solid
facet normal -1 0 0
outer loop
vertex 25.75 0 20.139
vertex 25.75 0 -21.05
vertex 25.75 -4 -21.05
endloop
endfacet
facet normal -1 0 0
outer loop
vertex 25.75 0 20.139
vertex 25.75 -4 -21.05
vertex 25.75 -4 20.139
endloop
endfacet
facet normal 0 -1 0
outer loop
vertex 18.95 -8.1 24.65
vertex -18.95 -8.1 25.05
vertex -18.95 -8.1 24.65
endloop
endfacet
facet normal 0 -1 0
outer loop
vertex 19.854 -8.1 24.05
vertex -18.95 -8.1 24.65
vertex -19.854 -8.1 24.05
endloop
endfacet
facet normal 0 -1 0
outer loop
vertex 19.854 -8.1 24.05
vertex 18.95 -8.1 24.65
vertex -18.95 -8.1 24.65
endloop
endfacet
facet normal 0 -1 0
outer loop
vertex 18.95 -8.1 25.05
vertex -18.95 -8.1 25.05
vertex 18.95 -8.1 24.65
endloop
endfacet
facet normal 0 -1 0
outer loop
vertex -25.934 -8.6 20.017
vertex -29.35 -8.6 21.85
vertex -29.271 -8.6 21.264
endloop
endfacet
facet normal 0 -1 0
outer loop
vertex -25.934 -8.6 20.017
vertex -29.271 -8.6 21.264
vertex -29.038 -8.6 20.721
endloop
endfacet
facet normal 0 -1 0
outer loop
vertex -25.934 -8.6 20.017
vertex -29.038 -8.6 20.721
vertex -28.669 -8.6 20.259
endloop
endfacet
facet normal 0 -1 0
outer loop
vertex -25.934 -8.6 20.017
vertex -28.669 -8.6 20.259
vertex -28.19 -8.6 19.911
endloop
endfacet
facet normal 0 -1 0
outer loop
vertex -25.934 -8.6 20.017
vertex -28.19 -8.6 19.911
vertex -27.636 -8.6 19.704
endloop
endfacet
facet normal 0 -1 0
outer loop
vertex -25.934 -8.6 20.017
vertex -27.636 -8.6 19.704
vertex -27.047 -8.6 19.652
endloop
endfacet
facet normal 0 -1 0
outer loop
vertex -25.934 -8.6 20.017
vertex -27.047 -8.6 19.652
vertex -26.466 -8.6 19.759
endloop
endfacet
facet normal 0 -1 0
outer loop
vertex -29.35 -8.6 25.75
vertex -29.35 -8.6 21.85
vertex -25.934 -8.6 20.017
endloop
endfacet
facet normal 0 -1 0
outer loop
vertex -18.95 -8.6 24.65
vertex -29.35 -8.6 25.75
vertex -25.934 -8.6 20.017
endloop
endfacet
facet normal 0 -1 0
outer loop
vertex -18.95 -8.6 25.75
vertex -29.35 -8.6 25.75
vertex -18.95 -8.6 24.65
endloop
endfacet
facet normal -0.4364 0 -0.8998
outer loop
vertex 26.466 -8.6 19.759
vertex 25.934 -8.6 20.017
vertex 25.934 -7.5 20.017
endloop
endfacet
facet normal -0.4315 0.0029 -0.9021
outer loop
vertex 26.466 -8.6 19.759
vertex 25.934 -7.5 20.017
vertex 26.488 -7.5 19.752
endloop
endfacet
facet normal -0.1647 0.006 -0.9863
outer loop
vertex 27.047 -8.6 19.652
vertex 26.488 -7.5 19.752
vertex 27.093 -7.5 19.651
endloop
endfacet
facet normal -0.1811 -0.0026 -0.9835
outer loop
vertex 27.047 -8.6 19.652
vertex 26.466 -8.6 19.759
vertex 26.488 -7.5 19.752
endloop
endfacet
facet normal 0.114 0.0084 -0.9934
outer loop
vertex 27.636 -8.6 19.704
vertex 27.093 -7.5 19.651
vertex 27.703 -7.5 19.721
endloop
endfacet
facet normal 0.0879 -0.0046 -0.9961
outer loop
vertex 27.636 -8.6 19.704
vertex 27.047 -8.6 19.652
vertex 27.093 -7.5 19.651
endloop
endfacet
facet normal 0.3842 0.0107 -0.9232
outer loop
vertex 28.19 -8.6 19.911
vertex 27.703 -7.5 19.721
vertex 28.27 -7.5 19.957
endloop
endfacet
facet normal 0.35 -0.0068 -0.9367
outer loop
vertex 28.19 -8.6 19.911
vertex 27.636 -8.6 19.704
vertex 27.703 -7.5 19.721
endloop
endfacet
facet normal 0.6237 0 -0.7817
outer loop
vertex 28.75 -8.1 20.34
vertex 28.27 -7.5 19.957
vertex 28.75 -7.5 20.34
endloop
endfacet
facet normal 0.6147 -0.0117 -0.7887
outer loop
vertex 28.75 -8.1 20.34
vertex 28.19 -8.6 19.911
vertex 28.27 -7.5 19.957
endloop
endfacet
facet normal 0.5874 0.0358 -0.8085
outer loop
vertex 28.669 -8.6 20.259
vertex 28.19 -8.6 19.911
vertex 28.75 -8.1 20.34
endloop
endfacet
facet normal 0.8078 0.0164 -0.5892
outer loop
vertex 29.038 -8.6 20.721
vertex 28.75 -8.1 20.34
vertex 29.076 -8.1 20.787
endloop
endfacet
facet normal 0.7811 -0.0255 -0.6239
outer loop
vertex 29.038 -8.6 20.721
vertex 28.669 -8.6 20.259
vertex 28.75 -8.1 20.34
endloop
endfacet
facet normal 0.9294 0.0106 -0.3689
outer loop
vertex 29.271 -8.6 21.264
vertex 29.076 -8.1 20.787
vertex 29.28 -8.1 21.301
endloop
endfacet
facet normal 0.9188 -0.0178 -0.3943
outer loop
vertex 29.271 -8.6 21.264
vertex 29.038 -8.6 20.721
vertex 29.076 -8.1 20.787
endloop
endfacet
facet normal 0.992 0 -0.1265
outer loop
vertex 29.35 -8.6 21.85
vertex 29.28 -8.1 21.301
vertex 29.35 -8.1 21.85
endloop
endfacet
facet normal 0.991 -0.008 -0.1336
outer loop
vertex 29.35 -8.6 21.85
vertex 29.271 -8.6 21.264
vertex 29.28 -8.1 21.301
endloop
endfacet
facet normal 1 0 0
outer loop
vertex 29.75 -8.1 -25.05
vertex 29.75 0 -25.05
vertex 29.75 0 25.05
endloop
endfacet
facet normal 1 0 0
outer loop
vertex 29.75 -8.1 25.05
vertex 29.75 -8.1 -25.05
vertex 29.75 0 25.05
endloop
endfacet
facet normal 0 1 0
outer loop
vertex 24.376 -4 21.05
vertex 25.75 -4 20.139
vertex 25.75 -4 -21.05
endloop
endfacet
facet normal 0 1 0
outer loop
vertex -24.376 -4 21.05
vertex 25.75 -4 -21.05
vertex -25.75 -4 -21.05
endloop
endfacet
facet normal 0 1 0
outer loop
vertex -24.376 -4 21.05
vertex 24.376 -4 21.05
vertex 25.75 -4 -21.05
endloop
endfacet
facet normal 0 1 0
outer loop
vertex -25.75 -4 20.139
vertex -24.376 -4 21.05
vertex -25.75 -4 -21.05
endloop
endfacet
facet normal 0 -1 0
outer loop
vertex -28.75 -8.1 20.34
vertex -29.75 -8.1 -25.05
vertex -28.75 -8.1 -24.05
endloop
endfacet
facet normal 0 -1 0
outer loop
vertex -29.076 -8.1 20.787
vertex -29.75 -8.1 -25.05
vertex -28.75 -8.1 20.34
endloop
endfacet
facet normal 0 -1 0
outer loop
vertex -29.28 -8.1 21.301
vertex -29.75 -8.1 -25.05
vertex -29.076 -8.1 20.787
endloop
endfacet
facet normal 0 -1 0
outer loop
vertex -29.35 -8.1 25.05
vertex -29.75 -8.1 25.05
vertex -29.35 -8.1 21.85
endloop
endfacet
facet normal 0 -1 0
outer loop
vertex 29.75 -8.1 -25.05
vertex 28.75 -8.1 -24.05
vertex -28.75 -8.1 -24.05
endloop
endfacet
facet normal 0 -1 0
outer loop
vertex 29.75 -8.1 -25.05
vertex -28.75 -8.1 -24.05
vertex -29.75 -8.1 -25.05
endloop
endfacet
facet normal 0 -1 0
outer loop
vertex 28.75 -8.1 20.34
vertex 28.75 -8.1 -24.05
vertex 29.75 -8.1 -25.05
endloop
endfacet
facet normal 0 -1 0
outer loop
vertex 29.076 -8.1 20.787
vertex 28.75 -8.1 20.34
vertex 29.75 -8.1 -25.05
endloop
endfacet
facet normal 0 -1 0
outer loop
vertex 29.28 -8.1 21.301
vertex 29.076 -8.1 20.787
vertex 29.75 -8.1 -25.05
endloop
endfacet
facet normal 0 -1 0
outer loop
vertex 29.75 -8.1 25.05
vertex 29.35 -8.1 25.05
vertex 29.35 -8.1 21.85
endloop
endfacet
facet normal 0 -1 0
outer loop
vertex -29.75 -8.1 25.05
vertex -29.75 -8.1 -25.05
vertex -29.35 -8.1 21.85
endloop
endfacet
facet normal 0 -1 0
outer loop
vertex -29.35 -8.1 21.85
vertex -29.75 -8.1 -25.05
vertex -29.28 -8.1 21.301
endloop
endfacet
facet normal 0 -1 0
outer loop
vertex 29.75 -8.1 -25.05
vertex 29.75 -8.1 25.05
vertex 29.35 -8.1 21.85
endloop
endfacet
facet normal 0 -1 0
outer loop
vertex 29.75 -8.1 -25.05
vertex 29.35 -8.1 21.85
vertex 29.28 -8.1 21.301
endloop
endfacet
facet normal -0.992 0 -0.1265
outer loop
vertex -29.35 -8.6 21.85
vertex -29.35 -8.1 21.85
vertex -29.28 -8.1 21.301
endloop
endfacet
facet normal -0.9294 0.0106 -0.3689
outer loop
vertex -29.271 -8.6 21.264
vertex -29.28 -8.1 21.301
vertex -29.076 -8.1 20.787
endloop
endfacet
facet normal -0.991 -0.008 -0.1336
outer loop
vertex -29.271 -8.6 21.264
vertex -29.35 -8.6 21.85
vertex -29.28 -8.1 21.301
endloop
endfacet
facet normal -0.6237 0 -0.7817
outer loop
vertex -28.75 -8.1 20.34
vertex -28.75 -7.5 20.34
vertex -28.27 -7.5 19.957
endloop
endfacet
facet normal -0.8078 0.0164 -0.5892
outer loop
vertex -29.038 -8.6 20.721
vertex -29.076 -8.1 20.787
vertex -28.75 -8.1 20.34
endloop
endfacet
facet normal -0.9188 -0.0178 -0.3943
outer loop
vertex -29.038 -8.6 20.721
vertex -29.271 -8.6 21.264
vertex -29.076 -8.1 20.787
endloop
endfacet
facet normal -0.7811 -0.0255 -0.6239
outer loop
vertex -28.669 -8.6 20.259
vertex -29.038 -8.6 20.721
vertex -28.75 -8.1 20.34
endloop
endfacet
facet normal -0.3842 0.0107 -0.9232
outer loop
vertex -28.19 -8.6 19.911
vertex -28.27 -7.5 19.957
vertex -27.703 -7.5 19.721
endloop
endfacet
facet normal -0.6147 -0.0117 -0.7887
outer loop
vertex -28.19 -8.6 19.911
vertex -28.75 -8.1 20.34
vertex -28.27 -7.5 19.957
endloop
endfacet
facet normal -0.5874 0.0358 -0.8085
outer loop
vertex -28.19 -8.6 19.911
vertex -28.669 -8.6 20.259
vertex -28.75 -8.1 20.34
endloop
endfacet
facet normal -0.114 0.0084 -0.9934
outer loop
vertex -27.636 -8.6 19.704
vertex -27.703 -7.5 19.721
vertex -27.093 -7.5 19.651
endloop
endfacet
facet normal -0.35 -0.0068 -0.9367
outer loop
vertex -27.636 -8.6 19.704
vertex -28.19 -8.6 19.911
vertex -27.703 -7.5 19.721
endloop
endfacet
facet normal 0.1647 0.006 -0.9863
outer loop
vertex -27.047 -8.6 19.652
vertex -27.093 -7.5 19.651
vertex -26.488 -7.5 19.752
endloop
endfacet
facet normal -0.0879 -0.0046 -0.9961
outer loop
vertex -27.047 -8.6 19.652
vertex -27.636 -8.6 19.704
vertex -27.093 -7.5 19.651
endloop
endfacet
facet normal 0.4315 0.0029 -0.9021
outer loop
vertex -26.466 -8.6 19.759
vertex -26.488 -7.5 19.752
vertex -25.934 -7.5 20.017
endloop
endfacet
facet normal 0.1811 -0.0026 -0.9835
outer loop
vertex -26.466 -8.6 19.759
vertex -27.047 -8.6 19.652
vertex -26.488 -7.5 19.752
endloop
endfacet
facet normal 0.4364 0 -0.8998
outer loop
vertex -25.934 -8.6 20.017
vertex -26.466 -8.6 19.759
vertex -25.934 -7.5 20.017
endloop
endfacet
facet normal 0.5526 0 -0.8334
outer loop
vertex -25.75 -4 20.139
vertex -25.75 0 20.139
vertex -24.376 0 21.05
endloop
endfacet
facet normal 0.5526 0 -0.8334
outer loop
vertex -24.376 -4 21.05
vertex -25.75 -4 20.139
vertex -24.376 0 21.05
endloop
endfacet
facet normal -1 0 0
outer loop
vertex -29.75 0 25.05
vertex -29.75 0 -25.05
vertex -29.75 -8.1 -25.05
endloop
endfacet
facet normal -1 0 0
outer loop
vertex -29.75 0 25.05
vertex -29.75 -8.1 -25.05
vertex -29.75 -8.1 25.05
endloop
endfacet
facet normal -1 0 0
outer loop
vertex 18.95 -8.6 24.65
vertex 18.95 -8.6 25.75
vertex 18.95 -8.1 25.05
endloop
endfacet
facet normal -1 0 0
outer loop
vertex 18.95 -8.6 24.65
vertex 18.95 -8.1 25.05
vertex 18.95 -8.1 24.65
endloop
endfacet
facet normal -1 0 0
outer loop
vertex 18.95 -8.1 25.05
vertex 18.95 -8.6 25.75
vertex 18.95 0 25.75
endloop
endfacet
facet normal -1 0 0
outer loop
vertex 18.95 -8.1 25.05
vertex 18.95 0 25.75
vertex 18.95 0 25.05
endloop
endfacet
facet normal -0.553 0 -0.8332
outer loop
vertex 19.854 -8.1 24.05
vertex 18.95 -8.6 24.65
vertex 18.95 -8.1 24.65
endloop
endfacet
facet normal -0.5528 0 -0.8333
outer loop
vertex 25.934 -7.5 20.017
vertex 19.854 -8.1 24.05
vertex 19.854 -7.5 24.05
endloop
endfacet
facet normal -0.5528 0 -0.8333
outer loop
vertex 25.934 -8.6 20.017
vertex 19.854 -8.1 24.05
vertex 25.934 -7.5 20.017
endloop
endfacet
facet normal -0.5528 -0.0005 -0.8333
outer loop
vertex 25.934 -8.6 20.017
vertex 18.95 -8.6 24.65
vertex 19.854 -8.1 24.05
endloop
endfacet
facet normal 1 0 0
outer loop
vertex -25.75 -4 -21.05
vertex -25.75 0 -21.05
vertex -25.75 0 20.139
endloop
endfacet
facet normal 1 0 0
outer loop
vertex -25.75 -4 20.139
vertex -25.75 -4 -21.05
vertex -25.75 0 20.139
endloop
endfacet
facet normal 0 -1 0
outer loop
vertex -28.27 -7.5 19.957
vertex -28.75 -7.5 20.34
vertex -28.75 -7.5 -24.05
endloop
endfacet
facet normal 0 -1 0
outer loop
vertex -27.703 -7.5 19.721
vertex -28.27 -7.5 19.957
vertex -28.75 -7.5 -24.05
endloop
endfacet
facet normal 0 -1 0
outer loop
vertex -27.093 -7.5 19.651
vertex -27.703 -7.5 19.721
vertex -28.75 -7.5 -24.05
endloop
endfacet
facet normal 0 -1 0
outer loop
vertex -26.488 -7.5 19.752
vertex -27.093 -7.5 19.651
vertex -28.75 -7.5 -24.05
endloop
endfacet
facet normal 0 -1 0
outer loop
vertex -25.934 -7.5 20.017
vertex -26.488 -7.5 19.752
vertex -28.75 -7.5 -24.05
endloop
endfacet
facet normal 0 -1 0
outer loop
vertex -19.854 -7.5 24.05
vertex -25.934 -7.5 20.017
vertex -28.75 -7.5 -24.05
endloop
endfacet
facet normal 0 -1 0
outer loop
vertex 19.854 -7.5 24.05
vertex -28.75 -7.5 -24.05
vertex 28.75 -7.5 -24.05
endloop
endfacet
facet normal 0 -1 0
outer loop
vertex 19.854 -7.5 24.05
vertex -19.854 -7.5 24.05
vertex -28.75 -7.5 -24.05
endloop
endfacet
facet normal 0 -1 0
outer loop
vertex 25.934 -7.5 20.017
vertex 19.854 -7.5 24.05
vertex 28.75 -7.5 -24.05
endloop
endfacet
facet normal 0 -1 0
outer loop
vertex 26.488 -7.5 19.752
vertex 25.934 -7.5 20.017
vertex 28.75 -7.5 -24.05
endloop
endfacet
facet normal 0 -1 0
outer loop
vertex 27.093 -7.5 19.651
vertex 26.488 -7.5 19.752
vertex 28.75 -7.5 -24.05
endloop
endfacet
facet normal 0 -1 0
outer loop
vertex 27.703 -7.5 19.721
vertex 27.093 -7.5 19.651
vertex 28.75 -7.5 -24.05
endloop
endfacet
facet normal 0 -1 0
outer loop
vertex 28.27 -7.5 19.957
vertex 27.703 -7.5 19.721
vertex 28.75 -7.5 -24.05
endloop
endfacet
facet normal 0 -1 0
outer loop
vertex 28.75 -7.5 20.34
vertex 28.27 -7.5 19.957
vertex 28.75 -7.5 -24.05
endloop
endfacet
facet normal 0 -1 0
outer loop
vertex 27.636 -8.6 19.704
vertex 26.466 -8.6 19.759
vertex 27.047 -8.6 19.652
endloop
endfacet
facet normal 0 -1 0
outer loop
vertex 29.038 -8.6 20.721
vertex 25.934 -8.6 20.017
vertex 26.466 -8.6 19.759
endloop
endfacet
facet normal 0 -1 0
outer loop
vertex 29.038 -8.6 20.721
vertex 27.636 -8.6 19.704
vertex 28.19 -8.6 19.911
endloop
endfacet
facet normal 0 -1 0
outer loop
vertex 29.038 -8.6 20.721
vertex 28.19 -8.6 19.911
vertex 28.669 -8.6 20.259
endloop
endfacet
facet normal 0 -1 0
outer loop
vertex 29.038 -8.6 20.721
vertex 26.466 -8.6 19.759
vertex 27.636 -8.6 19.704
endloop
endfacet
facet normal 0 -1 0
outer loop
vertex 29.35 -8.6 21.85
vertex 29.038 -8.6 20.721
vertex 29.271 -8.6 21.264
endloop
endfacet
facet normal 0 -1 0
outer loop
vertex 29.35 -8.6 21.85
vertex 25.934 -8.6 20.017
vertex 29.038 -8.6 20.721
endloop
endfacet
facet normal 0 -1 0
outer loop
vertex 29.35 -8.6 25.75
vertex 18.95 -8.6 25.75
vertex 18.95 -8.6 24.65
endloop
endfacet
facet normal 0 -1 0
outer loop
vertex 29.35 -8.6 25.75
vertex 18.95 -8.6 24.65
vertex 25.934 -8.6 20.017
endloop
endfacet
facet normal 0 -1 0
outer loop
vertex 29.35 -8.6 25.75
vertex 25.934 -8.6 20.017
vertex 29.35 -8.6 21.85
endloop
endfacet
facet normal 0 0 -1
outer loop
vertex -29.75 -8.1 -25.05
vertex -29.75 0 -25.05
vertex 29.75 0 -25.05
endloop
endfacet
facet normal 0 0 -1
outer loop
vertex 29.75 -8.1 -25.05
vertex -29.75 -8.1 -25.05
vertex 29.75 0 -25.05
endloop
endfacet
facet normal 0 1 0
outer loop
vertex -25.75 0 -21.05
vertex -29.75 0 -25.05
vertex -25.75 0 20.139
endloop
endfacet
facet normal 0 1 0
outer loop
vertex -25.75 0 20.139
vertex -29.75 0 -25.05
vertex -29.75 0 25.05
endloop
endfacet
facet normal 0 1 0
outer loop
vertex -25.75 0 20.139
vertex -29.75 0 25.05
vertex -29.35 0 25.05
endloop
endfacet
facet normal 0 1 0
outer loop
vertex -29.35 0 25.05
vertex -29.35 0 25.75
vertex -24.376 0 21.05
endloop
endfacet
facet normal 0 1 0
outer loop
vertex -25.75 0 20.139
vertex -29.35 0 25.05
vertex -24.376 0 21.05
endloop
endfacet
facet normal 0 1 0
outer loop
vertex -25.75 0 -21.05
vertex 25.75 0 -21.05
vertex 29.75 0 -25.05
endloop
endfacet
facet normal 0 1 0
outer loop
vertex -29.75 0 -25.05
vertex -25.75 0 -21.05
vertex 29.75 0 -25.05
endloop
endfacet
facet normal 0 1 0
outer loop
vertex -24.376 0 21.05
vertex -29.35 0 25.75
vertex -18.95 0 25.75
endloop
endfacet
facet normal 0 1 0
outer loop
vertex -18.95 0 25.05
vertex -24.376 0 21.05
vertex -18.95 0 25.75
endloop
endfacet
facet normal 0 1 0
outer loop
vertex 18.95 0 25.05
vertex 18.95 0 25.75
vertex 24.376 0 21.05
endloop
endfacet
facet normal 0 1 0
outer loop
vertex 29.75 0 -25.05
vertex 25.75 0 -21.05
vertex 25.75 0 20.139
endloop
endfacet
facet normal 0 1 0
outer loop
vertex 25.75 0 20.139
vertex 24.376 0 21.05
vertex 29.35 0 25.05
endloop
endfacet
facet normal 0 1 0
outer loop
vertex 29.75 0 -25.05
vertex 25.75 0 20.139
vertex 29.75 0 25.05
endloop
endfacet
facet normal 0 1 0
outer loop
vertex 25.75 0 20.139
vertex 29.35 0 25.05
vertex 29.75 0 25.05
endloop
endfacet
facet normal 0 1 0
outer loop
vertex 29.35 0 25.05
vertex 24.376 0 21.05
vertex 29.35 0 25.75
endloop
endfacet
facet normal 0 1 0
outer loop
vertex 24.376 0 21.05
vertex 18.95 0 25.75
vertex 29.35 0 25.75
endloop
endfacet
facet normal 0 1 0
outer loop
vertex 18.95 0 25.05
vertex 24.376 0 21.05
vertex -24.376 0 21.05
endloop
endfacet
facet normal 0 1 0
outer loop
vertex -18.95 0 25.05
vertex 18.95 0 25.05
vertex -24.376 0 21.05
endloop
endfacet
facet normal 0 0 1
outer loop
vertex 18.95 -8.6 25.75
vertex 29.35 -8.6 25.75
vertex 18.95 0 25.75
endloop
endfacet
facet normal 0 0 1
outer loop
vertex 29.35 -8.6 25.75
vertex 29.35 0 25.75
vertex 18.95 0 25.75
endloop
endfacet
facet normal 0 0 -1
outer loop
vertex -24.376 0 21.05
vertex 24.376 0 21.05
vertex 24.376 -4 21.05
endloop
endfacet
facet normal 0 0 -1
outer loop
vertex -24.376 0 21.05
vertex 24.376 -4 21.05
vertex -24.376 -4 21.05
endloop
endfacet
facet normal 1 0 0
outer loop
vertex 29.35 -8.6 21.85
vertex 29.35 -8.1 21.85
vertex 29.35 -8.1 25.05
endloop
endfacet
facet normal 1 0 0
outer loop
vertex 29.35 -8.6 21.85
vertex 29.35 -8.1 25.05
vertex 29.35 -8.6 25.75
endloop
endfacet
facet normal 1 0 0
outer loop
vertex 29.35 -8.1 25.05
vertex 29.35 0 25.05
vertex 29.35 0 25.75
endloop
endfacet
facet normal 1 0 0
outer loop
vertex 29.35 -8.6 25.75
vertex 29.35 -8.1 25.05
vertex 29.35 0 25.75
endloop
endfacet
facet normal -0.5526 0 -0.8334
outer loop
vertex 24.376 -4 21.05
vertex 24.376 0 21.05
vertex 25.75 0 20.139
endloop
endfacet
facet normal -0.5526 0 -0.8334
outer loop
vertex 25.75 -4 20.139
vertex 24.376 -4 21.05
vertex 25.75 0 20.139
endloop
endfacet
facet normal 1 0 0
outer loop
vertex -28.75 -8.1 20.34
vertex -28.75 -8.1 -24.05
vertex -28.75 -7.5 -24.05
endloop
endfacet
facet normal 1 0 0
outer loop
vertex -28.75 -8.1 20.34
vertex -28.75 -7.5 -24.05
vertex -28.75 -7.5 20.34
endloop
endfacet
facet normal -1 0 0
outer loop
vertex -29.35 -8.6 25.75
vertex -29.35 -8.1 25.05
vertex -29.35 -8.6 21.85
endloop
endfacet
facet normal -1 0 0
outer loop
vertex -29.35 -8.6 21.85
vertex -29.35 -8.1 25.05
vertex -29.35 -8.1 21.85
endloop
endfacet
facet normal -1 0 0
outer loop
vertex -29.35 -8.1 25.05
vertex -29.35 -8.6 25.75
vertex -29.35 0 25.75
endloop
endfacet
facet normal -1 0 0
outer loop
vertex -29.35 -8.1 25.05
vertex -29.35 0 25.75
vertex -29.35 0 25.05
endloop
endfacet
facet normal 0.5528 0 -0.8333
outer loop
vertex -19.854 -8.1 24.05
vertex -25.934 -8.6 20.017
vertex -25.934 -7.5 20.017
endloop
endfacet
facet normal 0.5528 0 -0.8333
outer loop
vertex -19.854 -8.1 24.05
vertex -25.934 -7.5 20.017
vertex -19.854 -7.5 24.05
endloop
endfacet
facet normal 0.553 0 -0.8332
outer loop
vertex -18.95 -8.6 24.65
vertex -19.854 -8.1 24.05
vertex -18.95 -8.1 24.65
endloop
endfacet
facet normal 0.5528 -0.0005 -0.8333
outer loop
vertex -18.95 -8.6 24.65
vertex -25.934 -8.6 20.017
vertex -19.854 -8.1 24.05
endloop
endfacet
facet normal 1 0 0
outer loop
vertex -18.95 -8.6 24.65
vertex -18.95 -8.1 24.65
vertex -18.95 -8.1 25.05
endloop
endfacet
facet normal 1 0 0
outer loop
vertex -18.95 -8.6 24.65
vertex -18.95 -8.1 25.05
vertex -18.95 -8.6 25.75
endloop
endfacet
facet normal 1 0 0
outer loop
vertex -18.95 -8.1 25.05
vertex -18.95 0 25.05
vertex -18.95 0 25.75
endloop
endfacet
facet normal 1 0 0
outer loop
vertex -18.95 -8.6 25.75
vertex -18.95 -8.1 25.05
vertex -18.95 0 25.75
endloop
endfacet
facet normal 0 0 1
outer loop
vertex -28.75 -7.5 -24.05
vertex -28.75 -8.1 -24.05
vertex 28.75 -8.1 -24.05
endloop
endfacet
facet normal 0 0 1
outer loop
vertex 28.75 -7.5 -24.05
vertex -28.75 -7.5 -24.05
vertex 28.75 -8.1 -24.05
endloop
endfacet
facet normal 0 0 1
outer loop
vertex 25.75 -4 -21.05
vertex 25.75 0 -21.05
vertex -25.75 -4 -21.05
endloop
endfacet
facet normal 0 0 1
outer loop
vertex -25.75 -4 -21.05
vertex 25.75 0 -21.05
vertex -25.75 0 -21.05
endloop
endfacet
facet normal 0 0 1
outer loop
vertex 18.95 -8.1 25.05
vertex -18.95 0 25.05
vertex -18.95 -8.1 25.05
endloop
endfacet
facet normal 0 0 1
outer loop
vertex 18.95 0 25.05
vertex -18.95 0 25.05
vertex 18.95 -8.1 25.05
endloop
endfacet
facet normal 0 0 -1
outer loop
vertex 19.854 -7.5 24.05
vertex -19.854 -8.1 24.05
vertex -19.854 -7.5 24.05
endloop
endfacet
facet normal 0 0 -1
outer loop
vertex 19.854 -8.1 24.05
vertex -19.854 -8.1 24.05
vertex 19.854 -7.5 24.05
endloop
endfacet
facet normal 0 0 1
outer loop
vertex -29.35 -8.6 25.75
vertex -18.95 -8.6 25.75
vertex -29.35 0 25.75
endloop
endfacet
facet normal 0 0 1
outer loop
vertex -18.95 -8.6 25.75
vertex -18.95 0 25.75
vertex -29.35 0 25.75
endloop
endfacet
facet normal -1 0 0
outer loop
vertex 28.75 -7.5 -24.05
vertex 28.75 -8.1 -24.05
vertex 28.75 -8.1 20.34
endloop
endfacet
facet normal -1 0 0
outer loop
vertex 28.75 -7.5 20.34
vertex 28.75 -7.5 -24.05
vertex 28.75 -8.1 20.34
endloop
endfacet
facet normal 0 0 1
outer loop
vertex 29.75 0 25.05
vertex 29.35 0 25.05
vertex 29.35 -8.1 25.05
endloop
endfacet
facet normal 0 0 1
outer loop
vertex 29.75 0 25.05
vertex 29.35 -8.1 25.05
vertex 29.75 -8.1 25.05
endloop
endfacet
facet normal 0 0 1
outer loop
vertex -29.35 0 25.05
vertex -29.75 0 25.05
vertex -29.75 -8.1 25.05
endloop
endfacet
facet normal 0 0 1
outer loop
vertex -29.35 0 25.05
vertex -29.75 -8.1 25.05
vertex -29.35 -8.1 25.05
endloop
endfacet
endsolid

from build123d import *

# Parameters (mm, degrees)
F0_W          = 59.5
F0_H          = 50.1
F1_DEPTH      = 8.1
F2_W          = 57.5
F2_H          = 48.1
F3_DEPTH      = 0.6
F4_W          = 51.5
F4_H          = 42.1
F5_DEPTH      = 4
F7_DEPTH      = 0.5
F7_DEPTH_BACK = 8.1


with BuildPart() as f1:
    # F0 (on Front) → F1 (new body)
    with BuildSketch(Plane.XZ):
        Rectangle(F0_W, F0_H)
    extrude(amount=F1_DEPTH)

    # F2 (on face) → F3 (cut)
    with BuildSketch(Plane.XZ.offset(8.1)):
        Rectangle(F2_W, F2_H)
    extrude(amount=-F3_DEPTH, mode=Mode.SUBTRACT)

    # F4 (on face) → F5 (cut)
    with BuildSketch(Plane(origin=(0, 0, 0), x_dir=(-1, 0, 0), z_dir=(0, 1, 0))):
        Rectangle(F4_W, F4_H)
    extrude(amount=-F5_DEPTH, mode=Mode.SUBTRACT)

    # F6 (on face) → F7 (join, two sides)
    with BuildSketch(Plane.XZ.offset(8.1)) as f7_sk:
        with BuildLine():
            ThreePointArc((25.93377, 20.016756), (28.190263, 19.911482), (29.35, 21.85))
            Line((29.35, 21.85), (29.35, 25.75))
            Line((29.35, 25.75), (18.95, 25.75))
            Line((18.95, 25.75), (18.95, 24.65))
            Line((18.95, 24.65), (25.93377, 20.016756))
        make_face()
        with BuildLine():
            Line((-18.95, 24.65), (-18.95, 25.75))
            Line((-18.95, 25.75), (-29.35, 25.75))
            Line((-29.35, 25.75), (-29.35, 21.85))
            ThreePointArc((-29.35, 21.85), (-28.190263, 19.911482), (-25.93377, 20.016756))
            Line((-25.93377, 20.016756), (-18.95, 24.65))
        make_face()
    extrude(amount=F7_DEPTH)
    extrude(f7_sk.sketch, amount=-F7_DEPTH_BACK)


solid = f1.part
